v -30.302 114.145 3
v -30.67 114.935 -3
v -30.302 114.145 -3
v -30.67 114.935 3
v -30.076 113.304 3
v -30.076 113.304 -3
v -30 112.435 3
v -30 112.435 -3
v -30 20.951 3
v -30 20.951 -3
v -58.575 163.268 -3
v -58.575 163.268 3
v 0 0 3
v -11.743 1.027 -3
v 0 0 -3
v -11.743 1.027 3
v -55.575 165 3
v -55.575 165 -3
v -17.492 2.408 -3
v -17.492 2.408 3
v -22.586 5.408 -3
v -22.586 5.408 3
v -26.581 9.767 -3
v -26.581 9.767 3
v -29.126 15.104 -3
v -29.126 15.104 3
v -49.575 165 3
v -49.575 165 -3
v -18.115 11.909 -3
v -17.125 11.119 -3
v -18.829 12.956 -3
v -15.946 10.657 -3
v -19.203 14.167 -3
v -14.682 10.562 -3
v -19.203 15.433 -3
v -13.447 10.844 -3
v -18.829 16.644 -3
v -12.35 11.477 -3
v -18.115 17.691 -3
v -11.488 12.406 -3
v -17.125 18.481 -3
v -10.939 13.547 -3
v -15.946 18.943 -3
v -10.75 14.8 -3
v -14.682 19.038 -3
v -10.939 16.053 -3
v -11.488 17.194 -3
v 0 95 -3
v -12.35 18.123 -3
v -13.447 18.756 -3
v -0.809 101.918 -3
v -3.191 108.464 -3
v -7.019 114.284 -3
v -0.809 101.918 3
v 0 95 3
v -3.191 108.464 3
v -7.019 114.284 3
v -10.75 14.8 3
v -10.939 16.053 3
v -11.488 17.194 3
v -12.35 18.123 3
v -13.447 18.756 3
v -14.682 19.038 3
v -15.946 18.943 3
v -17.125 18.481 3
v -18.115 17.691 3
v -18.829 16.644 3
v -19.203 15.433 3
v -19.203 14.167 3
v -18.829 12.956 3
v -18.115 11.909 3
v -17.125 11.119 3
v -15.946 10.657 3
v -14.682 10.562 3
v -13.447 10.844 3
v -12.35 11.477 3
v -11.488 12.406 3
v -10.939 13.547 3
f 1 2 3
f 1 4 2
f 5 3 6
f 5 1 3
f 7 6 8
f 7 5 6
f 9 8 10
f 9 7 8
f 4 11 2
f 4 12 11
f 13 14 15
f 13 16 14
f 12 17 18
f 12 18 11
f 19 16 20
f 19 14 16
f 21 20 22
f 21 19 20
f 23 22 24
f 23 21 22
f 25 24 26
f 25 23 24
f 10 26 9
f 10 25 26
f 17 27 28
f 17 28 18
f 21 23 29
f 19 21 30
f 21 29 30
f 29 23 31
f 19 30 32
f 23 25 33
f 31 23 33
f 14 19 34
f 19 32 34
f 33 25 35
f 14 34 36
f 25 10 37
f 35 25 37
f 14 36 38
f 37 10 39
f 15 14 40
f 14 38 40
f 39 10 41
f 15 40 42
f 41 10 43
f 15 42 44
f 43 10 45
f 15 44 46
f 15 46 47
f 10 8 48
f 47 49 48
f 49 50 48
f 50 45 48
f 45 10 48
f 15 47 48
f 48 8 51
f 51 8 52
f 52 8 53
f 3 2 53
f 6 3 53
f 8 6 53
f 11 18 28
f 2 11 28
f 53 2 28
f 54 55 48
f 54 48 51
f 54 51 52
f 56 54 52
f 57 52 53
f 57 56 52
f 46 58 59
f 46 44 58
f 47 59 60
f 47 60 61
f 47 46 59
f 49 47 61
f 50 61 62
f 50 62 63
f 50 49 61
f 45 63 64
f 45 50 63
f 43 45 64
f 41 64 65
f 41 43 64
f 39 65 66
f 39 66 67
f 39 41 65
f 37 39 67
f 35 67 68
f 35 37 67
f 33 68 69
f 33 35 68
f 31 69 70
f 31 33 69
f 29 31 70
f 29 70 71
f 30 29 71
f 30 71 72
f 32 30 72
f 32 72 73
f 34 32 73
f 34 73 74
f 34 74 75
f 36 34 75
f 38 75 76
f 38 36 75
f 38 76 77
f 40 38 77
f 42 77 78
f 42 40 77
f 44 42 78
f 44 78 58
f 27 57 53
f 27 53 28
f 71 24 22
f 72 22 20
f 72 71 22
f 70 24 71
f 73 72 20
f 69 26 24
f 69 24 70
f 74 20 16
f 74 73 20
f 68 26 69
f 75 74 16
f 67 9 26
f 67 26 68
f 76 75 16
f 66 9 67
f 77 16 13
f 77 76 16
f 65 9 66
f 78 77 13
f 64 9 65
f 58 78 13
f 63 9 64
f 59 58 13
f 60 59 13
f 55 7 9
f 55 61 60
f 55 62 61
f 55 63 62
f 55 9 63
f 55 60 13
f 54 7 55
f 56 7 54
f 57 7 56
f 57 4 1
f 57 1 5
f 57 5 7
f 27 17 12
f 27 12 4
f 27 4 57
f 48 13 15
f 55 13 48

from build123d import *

# Parameters (mm, degrees)
SKETCH1_R      = 4.25
EXTRUDE1_DEPTH = 3
FILLET1_R      = 20


with BuildPart() as part:
    # Sketch1 → Extrude1 (new, symmetric)
    with BuildSketch(Plane.XY):
        with BuildLine():
            Line((0, 0), (0, 95))
            ThreePointArc((0, 95), (-1.809221376, 105.2606043), (-7.018666706, 114.283628291))
            Line((-7.018666706, 114.283628291), (-49.574755502, 165))
            Line((-49.574755502, 165), (-55.574755502, 165))
            Line((-55.574755502, 165), (-58.574755502, 163.267949192))
            Line((-58.574755502, 163.267949192), (-30.669872981, 114.935274886))
            ThreePointArc((-30.669872981, 114.935274886), (-30.170370869, 113.729370112), (-30, 112.435274886))
            Line((-30, 112.435274886), (-30, 2.624659906))
            Line((-30, 2.624659906), (0, 0))
        make_face()
        with Locations((-15, 14.8)):
            Circle(SKETCH1_R, mode=Mode.SUBTRACT)
    extrude(amount=EXTRUDE1_DEPTH, both=True)

    # Fillet1
    fillet1_edges = [part.edges().sort_by_distance(p)[0] for p in [
        (-30, 2.624659906, 0),
    ]]
    fillet(fillet1_edges, radius=FILLET1_R)


solid = part.part
